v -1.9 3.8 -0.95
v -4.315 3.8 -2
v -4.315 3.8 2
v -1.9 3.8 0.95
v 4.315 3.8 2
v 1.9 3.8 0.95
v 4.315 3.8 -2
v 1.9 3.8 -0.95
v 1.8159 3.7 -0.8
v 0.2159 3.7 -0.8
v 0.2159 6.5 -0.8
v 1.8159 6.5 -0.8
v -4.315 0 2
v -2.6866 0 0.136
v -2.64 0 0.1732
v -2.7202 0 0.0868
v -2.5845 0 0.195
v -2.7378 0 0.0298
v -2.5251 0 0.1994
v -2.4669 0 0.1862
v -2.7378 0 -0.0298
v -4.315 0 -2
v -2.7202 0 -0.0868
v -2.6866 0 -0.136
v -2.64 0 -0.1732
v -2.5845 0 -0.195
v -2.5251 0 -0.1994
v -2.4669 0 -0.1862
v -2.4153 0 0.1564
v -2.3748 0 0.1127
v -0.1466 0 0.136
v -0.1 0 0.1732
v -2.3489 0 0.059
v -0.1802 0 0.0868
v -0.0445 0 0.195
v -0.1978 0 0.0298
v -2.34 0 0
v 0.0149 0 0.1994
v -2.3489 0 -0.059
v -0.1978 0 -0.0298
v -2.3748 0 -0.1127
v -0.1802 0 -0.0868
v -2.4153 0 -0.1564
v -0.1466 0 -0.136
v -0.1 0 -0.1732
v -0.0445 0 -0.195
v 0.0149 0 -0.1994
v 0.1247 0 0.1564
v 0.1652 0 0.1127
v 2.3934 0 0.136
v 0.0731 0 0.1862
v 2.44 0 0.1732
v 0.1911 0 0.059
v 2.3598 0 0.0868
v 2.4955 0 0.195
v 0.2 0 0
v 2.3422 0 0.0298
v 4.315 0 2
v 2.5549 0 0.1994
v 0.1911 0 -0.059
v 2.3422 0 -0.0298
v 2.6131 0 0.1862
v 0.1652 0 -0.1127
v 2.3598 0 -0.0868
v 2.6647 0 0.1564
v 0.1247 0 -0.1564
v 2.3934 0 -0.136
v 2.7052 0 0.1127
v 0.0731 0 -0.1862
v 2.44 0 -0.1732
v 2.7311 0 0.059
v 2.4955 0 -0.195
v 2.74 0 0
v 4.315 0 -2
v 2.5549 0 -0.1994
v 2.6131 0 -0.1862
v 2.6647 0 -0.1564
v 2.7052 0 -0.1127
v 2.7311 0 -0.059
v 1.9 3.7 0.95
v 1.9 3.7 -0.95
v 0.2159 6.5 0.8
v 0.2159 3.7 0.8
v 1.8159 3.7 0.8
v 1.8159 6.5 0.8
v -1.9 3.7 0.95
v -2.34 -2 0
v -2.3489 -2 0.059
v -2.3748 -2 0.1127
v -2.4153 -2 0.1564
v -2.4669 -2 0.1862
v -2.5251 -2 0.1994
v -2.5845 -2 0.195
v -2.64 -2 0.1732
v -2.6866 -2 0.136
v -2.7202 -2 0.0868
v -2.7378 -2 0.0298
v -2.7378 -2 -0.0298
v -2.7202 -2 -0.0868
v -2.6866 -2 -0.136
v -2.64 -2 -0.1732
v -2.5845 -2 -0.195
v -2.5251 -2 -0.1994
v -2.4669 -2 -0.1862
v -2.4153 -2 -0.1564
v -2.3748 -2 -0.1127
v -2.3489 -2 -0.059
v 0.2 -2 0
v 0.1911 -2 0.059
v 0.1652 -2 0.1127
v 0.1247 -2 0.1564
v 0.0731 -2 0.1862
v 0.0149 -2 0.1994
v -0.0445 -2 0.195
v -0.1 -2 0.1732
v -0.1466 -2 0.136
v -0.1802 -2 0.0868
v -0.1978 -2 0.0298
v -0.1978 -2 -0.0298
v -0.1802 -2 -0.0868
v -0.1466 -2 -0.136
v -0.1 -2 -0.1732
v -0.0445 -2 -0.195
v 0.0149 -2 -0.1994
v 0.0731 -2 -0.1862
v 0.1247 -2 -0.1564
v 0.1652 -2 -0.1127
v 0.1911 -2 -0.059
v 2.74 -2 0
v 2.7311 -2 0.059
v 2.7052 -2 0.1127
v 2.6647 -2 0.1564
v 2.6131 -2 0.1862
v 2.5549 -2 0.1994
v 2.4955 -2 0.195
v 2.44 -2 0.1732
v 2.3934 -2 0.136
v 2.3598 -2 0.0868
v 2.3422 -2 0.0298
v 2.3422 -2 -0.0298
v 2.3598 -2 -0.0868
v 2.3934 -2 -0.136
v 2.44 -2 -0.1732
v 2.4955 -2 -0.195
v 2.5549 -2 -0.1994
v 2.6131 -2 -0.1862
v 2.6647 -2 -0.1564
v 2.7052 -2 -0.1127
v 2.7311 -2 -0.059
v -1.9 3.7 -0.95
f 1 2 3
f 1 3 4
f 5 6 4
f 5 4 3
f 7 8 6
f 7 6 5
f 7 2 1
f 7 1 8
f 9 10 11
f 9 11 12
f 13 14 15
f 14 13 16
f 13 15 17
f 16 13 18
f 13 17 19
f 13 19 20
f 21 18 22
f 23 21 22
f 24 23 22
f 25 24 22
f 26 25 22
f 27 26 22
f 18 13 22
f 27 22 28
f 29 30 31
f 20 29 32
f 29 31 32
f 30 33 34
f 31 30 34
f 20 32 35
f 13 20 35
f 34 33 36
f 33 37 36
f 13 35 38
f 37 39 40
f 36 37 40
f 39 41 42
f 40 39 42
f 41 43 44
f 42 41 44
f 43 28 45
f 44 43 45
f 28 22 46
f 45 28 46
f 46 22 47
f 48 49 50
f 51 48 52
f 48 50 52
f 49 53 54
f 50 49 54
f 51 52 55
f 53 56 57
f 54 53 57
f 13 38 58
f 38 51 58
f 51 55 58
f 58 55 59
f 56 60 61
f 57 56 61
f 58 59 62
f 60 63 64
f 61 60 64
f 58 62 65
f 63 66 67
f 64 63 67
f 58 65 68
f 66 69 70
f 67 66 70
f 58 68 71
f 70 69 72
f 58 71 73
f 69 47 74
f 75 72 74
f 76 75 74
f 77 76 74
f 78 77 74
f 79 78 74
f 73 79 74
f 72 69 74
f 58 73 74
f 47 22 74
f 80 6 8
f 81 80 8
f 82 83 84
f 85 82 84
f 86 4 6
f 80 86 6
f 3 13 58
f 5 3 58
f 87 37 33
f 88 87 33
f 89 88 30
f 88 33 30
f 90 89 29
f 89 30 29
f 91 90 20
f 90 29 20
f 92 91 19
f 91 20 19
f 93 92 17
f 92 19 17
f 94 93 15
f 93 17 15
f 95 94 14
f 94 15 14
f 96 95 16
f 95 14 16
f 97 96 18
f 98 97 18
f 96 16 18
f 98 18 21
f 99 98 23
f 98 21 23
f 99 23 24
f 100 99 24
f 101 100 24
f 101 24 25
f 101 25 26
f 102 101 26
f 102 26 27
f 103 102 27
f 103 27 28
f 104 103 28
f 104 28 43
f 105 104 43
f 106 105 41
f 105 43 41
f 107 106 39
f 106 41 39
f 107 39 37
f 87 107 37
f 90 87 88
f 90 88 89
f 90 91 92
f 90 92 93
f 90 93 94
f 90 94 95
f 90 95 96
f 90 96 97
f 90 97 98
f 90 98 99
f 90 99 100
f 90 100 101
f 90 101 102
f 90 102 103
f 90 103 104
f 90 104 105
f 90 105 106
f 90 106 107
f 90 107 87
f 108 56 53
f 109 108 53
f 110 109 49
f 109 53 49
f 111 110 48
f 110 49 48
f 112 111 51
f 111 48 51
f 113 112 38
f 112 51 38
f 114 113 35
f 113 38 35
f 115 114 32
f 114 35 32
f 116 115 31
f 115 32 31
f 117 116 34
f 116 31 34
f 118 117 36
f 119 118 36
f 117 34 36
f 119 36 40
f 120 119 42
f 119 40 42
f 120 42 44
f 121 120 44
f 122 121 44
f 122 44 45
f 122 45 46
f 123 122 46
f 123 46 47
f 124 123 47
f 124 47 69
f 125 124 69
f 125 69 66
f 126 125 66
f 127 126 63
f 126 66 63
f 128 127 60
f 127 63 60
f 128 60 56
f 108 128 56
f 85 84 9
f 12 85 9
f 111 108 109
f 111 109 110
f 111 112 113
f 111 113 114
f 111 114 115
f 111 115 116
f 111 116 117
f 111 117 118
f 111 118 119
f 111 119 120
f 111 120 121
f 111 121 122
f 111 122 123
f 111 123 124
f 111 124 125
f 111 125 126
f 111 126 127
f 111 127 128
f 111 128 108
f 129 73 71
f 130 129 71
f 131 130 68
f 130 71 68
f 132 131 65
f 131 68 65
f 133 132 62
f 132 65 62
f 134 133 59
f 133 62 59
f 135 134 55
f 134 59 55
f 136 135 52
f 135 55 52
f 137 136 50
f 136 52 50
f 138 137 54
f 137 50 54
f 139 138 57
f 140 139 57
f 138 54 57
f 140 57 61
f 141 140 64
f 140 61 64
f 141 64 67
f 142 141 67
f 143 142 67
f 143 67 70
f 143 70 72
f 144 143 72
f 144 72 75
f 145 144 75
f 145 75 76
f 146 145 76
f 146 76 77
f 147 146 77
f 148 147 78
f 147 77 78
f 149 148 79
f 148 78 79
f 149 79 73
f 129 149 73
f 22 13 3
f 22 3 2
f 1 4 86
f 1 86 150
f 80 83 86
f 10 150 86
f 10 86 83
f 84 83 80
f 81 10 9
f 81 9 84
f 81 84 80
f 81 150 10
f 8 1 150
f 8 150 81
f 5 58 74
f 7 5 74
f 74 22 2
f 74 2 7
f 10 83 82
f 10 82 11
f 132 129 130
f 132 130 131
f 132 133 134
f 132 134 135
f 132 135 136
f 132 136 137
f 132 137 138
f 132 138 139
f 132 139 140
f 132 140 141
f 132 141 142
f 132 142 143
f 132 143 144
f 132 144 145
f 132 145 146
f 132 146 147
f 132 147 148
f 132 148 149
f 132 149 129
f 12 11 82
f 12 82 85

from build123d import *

# Parameters (mm, degrees)
SKETCH_1_W          = 8.63
SKETCH_1_H          = 4
EXTRUDE_1_DEPTH     = 3.8
SKETCH_2_W          = 3.8
SKETCH_2_H          = 1.9
CUT_EXTRUDE_1_DEPTH = 0.1
SKETCH_3_W          = 1.6
SKETCH_3_H          = 1.6
EXTRUDE_2_DEPTH     = 2.8
SKETCH_4_R          = 0.2
EXTRUDE_3_DEPTH     = 2


with BuildPart() as part:
    # Эскиз1 → Бобышка-Вытянуть1 (new body)
    with BuildSketch(Plane(origin=(0, 0, 0), x_dir=(1, 0, 0), z_dir=(0, 1, 0))):
        Rectangle(SKETCH_1_W, SKETCH_1_H)
    extrude(amount=EXTRUDE_1_DEPTH)

    # Эскиз2 → Вырез-Вытянуть1 (cut)
    with BuildSketch(Plane(origin=(0, 3.8, 0), x_dir=(1, 0, 0), z_dir=(0, 1, 0))):
        Rectangle(SKETCH_2_W, SKETCH_2_H)
    extrude(amount=-CUT_EXTRUDE_1_DEPTH, mode=Mode.SUBTRACT)

    # Эскиз3 → Бобышка-Вытянуть2 (add)
    with BuildSketch(Plane(origin=(0, 3.7, 0), x_dir=(1, 0, 0), z_dir=(0, 1, 0))):
        with Locations((1.01593525, 0)):
            Rectangle(SKETCH_3_W, SKETCH_3_H)
    extrude(amount=EXTRUDE_2_DEPTH)

    # Эскиз4 → Бобышка-Вытянуть3 (add)
    with BuildSketch(Plane.XZ):
        with Locations((-2.54, 0)):
            Circle(SKETCH_4_R)
        Circle(SKETCH_4_R)
        with Locations((2.54, 0)):
            Circle(SKETCH_4_R)
    extrude(amount=EXTRUDE_3_DEPTH)


solid = part.part
